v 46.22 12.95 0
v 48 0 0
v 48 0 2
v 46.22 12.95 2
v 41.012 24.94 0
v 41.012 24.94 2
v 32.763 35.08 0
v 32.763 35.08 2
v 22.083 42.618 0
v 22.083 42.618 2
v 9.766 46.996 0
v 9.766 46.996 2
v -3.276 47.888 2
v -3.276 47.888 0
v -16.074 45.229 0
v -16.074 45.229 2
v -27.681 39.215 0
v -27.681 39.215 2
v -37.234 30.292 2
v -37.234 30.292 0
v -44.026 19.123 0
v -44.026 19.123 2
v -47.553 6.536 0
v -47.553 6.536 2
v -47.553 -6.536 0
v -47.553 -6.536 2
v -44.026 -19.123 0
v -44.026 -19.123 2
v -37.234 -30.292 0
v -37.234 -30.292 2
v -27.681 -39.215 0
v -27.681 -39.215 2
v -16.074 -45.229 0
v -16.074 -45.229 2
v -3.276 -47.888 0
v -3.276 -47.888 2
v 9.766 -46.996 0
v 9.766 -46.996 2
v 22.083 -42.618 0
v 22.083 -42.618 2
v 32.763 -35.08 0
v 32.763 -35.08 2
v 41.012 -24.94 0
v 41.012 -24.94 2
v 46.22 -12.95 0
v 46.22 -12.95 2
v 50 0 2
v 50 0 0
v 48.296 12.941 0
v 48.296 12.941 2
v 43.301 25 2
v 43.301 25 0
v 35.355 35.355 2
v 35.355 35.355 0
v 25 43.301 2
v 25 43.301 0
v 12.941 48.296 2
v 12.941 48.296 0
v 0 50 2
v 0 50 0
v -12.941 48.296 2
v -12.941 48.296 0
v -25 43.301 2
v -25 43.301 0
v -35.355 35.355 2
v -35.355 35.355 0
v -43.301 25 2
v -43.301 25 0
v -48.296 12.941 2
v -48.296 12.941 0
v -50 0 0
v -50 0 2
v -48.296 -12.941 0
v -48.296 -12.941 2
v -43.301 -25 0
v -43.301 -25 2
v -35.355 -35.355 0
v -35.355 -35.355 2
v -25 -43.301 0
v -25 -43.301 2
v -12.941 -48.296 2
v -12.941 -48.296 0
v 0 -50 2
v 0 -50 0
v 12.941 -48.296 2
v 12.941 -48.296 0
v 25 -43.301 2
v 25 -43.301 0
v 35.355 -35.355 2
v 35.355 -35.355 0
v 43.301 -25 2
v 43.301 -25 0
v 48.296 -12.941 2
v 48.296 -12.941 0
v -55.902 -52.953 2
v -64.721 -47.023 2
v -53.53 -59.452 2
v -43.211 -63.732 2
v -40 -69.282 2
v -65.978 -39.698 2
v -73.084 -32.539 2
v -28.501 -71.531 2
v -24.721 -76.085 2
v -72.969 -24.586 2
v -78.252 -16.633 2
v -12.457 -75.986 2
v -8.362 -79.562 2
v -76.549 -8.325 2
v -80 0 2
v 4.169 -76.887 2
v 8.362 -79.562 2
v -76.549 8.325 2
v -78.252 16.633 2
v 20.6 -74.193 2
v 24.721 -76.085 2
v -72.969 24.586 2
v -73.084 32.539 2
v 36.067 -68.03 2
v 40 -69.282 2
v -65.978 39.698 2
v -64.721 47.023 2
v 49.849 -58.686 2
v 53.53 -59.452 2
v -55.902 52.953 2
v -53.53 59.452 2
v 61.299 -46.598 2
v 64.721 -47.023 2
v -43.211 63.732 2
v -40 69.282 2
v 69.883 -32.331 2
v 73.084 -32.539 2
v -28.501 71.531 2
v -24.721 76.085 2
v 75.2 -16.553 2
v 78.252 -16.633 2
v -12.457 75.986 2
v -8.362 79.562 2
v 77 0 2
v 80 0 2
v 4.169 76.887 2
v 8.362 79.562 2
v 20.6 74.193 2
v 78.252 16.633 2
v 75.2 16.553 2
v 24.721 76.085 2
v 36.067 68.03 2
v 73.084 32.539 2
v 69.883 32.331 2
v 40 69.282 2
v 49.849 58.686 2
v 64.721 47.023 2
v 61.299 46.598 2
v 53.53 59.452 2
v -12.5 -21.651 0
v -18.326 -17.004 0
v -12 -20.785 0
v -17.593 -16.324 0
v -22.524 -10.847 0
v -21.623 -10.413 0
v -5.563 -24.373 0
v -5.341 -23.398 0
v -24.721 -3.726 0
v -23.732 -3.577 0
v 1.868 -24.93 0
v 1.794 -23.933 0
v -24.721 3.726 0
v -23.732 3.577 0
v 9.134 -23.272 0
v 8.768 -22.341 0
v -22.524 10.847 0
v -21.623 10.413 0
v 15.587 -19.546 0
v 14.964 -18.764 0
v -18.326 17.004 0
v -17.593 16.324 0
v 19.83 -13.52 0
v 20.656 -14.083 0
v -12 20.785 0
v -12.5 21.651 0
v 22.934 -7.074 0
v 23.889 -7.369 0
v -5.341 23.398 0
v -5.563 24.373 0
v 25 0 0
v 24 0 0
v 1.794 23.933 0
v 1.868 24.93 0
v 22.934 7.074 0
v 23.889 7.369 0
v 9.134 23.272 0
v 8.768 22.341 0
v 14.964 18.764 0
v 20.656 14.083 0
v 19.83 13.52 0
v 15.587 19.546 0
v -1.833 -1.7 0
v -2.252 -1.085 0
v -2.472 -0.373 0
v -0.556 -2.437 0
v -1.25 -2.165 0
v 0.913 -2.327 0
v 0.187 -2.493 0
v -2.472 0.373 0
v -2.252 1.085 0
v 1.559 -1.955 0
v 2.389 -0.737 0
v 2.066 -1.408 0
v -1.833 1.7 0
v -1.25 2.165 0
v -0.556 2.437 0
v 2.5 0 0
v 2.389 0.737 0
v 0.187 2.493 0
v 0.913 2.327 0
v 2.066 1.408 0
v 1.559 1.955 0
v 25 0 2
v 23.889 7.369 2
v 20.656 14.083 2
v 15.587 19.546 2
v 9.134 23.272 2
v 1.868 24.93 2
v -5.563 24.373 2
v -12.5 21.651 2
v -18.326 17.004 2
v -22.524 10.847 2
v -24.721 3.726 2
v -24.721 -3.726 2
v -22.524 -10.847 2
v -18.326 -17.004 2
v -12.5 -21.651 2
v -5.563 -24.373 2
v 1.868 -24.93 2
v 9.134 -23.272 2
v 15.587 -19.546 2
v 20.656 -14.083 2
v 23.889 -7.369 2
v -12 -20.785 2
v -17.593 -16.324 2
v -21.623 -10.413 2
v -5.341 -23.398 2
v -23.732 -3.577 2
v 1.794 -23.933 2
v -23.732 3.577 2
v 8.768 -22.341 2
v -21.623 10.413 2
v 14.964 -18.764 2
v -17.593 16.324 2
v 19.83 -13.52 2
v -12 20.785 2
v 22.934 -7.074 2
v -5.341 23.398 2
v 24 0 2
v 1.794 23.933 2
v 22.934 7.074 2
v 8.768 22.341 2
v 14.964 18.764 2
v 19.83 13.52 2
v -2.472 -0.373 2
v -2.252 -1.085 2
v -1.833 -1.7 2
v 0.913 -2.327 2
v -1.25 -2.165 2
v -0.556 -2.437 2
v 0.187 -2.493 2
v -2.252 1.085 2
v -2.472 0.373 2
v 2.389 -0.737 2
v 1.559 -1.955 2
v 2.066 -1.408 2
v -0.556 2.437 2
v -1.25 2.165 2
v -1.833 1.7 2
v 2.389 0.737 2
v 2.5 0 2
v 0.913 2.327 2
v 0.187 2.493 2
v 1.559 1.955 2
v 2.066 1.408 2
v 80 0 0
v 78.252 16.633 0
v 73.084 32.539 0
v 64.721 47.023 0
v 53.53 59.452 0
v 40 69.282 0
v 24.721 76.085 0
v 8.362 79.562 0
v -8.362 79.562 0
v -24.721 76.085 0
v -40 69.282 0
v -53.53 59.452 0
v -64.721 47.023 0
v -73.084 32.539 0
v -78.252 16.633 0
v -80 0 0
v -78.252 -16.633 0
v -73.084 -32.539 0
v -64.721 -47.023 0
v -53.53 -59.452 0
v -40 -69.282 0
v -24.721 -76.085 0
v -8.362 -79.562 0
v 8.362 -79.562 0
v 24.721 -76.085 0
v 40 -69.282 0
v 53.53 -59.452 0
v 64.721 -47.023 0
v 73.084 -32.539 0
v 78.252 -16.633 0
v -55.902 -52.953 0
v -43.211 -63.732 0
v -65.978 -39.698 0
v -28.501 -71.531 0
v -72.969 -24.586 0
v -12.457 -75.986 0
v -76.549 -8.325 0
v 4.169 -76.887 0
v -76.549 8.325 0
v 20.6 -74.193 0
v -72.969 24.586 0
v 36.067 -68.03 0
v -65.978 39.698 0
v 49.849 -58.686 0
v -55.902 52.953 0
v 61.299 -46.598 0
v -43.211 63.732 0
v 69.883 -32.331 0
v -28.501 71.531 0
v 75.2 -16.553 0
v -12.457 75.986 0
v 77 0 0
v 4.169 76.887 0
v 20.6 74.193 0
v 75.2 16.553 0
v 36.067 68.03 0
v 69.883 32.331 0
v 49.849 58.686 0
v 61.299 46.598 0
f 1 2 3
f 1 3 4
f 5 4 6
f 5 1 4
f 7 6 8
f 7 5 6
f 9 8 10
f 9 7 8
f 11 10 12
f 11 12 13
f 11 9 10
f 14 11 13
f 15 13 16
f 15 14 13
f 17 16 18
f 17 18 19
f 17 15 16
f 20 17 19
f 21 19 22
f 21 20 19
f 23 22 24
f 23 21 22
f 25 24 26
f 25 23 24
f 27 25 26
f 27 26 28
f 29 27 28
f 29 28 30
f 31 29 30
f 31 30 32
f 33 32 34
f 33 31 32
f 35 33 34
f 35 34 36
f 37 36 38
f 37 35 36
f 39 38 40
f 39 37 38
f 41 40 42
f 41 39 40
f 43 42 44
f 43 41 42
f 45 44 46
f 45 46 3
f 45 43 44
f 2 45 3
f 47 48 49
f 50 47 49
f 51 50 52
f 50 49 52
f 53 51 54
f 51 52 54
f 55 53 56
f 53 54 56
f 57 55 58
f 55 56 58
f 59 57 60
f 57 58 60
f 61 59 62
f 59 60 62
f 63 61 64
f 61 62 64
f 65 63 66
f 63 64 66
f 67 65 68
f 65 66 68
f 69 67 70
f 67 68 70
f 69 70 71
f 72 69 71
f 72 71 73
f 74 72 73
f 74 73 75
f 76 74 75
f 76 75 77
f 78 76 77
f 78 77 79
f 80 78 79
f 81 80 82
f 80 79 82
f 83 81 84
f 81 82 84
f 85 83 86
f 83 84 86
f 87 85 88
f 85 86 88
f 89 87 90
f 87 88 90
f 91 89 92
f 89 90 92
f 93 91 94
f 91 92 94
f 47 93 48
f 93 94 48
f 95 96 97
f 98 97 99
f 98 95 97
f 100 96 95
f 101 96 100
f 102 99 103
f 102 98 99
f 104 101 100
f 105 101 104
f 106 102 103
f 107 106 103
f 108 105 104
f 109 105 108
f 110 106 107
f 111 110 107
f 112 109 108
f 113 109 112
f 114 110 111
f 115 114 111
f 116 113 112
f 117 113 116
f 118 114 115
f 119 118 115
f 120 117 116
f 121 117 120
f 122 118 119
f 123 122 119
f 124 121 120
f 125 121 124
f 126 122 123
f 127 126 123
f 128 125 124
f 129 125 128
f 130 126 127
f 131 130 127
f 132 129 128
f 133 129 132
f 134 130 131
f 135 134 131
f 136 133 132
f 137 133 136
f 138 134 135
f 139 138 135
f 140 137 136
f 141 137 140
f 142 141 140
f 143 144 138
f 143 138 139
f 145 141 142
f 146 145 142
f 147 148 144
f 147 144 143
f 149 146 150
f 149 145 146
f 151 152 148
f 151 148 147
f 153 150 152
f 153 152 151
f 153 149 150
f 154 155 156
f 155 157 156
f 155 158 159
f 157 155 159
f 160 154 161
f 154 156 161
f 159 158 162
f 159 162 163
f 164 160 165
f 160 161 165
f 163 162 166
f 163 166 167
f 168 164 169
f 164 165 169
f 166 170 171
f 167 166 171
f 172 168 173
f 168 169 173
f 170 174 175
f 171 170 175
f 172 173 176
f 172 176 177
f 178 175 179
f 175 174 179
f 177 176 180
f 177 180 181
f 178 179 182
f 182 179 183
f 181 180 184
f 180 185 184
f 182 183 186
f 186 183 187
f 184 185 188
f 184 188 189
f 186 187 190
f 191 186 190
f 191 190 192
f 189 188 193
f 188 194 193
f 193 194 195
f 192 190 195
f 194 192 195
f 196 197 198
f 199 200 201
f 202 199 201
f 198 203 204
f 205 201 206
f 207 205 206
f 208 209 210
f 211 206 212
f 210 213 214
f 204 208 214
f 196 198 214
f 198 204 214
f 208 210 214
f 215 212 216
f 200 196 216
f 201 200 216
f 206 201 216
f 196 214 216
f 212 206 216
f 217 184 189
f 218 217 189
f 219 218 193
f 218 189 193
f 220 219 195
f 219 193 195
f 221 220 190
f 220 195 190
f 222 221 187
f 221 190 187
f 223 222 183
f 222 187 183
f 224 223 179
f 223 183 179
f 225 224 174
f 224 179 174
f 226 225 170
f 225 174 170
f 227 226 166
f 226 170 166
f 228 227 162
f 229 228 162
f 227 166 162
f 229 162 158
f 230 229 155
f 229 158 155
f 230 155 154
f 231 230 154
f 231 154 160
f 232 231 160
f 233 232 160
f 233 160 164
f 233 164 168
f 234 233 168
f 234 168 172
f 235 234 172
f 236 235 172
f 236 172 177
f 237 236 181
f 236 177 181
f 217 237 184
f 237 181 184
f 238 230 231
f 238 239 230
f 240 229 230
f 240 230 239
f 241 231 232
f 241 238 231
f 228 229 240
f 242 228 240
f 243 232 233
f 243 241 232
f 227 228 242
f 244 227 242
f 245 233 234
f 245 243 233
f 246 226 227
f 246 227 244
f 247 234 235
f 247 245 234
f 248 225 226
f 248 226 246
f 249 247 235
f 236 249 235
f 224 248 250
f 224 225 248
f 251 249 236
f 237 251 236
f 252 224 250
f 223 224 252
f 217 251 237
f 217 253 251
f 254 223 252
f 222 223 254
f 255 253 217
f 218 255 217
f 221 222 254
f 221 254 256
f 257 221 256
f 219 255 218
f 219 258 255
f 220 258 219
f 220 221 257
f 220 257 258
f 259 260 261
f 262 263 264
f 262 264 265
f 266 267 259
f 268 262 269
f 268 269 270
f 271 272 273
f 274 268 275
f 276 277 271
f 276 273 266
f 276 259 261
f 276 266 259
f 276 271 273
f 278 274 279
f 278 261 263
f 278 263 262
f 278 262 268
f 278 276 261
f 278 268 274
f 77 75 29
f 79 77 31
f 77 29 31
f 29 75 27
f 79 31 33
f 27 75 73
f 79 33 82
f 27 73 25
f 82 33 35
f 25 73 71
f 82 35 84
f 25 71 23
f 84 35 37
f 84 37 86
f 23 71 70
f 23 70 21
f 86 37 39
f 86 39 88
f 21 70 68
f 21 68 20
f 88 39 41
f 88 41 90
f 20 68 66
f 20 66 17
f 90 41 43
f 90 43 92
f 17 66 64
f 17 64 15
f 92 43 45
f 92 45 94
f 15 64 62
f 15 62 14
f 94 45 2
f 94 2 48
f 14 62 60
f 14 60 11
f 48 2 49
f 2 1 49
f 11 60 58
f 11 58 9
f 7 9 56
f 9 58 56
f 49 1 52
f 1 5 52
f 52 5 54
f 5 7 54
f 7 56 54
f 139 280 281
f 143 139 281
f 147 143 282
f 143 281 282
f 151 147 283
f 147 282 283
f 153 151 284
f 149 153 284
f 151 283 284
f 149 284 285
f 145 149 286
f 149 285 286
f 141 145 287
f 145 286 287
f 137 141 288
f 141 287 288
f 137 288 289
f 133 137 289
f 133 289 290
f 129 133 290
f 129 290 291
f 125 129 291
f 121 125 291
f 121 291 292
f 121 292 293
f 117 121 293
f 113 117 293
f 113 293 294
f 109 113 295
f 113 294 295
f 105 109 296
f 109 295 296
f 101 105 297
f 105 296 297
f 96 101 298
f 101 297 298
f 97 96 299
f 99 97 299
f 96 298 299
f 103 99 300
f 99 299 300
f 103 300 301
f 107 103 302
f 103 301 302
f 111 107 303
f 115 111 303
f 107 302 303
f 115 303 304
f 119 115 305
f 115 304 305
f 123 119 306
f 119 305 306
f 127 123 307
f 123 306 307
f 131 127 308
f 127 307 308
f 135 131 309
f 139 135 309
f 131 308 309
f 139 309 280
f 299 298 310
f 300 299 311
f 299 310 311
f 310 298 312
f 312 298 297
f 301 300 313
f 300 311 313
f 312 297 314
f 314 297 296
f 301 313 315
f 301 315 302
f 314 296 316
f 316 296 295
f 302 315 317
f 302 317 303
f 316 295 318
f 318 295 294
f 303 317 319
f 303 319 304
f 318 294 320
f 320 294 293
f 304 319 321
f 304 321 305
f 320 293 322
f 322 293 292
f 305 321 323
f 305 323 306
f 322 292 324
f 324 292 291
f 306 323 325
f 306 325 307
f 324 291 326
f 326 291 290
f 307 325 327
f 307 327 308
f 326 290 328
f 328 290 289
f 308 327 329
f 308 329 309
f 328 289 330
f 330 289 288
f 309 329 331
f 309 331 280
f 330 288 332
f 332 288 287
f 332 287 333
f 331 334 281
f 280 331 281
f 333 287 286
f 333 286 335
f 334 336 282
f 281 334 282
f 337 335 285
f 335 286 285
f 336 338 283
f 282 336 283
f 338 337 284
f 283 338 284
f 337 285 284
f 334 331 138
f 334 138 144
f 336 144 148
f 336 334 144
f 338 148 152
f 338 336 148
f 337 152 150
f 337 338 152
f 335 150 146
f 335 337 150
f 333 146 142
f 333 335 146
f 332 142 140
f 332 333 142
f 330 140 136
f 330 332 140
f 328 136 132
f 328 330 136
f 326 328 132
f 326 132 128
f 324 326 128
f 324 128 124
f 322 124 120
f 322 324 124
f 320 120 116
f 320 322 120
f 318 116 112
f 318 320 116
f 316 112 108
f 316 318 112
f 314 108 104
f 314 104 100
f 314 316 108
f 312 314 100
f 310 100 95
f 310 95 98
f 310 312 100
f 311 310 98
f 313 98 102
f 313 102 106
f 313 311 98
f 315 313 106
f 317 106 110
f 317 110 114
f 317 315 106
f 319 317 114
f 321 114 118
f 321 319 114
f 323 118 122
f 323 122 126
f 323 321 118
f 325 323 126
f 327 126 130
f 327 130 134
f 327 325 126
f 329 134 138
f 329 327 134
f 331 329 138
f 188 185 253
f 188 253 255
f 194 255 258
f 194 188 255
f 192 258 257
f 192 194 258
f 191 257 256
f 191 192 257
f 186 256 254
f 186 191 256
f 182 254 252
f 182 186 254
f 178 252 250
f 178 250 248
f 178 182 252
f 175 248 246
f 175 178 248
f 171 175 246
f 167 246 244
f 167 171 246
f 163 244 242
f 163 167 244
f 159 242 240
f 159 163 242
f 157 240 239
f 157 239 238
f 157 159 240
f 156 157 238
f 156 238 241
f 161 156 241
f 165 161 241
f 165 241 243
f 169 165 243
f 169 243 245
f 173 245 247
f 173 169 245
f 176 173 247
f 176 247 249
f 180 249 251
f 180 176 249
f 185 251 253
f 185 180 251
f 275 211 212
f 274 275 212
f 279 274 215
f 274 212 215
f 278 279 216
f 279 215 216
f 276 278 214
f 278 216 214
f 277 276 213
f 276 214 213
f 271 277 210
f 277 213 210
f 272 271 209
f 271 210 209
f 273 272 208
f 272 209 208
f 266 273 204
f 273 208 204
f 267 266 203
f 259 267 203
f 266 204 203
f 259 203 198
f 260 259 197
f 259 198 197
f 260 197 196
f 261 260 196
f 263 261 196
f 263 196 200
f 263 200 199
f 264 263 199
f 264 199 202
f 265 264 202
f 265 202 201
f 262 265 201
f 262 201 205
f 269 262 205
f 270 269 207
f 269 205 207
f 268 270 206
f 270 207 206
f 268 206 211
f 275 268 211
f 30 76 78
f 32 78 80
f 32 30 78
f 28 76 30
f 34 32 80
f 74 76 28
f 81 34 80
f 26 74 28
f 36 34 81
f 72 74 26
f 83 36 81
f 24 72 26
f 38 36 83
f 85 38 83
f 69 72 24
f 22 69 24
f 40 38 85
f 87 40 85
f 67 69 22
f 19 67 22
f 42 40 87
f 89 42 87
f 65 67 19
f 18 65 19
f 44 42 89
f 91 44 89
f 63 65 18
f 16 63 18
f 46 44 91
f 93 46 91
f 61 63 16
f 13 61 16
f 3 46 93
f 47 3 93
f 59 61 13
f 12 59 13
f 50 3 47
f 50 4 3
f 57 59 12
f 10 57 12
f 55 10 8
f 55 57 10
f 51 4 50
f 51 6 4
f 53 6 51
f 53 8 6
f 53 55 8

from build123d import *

# Parameters (mm, degrees)
F0_R     = 50
F0_R_2   = 48
F1_DEPTH = 2
F0_R_3   = 80
F0_R_4   = 77
F0_R_5   = 25
F0_R_6   = 24
F0_R_7   = 2.5


with BuildPart() as f1:
    # F0 (on Top) → F1 (new body)
    with BuildSketch(Plane.XY):
        Circle(F0_R)
        Circle(F0_R_2, mode=Mode.SUBTRACT)
    extrude(amount=F1_DEPTH)


with BuildPart() as f1b:
    # F0 (on Top) → F1, piece 2 (new body)
    with BuildSketch(Plane.XY):
        Circle(F0_R_3)
        Circle(F0_R_4, mode=Mode.SUBTRACT)
    extrude(amount=F1_DEPTH)


with BuildPart() as f1c:
    # F0 (on Top) → F1, piece 3 (new body)
    with BuildSketch(Plane.XY):
        Circle(F0_R_5)
        Circle(F0_R_6, mode=Mode.SUBTRACT)
    extrude(amount=F1_DEPTH)


with BuildPart() as f1d:
    # F0 (on Top) → F1, piece 4 (new body)
    with BuildSketch(Plane.XY):
        Circle(F0_R_7)
    extrude(amount=F1_DEPTH)


solid = Compound([f1.part, f1b.part, f1c.part, f1d.part])
